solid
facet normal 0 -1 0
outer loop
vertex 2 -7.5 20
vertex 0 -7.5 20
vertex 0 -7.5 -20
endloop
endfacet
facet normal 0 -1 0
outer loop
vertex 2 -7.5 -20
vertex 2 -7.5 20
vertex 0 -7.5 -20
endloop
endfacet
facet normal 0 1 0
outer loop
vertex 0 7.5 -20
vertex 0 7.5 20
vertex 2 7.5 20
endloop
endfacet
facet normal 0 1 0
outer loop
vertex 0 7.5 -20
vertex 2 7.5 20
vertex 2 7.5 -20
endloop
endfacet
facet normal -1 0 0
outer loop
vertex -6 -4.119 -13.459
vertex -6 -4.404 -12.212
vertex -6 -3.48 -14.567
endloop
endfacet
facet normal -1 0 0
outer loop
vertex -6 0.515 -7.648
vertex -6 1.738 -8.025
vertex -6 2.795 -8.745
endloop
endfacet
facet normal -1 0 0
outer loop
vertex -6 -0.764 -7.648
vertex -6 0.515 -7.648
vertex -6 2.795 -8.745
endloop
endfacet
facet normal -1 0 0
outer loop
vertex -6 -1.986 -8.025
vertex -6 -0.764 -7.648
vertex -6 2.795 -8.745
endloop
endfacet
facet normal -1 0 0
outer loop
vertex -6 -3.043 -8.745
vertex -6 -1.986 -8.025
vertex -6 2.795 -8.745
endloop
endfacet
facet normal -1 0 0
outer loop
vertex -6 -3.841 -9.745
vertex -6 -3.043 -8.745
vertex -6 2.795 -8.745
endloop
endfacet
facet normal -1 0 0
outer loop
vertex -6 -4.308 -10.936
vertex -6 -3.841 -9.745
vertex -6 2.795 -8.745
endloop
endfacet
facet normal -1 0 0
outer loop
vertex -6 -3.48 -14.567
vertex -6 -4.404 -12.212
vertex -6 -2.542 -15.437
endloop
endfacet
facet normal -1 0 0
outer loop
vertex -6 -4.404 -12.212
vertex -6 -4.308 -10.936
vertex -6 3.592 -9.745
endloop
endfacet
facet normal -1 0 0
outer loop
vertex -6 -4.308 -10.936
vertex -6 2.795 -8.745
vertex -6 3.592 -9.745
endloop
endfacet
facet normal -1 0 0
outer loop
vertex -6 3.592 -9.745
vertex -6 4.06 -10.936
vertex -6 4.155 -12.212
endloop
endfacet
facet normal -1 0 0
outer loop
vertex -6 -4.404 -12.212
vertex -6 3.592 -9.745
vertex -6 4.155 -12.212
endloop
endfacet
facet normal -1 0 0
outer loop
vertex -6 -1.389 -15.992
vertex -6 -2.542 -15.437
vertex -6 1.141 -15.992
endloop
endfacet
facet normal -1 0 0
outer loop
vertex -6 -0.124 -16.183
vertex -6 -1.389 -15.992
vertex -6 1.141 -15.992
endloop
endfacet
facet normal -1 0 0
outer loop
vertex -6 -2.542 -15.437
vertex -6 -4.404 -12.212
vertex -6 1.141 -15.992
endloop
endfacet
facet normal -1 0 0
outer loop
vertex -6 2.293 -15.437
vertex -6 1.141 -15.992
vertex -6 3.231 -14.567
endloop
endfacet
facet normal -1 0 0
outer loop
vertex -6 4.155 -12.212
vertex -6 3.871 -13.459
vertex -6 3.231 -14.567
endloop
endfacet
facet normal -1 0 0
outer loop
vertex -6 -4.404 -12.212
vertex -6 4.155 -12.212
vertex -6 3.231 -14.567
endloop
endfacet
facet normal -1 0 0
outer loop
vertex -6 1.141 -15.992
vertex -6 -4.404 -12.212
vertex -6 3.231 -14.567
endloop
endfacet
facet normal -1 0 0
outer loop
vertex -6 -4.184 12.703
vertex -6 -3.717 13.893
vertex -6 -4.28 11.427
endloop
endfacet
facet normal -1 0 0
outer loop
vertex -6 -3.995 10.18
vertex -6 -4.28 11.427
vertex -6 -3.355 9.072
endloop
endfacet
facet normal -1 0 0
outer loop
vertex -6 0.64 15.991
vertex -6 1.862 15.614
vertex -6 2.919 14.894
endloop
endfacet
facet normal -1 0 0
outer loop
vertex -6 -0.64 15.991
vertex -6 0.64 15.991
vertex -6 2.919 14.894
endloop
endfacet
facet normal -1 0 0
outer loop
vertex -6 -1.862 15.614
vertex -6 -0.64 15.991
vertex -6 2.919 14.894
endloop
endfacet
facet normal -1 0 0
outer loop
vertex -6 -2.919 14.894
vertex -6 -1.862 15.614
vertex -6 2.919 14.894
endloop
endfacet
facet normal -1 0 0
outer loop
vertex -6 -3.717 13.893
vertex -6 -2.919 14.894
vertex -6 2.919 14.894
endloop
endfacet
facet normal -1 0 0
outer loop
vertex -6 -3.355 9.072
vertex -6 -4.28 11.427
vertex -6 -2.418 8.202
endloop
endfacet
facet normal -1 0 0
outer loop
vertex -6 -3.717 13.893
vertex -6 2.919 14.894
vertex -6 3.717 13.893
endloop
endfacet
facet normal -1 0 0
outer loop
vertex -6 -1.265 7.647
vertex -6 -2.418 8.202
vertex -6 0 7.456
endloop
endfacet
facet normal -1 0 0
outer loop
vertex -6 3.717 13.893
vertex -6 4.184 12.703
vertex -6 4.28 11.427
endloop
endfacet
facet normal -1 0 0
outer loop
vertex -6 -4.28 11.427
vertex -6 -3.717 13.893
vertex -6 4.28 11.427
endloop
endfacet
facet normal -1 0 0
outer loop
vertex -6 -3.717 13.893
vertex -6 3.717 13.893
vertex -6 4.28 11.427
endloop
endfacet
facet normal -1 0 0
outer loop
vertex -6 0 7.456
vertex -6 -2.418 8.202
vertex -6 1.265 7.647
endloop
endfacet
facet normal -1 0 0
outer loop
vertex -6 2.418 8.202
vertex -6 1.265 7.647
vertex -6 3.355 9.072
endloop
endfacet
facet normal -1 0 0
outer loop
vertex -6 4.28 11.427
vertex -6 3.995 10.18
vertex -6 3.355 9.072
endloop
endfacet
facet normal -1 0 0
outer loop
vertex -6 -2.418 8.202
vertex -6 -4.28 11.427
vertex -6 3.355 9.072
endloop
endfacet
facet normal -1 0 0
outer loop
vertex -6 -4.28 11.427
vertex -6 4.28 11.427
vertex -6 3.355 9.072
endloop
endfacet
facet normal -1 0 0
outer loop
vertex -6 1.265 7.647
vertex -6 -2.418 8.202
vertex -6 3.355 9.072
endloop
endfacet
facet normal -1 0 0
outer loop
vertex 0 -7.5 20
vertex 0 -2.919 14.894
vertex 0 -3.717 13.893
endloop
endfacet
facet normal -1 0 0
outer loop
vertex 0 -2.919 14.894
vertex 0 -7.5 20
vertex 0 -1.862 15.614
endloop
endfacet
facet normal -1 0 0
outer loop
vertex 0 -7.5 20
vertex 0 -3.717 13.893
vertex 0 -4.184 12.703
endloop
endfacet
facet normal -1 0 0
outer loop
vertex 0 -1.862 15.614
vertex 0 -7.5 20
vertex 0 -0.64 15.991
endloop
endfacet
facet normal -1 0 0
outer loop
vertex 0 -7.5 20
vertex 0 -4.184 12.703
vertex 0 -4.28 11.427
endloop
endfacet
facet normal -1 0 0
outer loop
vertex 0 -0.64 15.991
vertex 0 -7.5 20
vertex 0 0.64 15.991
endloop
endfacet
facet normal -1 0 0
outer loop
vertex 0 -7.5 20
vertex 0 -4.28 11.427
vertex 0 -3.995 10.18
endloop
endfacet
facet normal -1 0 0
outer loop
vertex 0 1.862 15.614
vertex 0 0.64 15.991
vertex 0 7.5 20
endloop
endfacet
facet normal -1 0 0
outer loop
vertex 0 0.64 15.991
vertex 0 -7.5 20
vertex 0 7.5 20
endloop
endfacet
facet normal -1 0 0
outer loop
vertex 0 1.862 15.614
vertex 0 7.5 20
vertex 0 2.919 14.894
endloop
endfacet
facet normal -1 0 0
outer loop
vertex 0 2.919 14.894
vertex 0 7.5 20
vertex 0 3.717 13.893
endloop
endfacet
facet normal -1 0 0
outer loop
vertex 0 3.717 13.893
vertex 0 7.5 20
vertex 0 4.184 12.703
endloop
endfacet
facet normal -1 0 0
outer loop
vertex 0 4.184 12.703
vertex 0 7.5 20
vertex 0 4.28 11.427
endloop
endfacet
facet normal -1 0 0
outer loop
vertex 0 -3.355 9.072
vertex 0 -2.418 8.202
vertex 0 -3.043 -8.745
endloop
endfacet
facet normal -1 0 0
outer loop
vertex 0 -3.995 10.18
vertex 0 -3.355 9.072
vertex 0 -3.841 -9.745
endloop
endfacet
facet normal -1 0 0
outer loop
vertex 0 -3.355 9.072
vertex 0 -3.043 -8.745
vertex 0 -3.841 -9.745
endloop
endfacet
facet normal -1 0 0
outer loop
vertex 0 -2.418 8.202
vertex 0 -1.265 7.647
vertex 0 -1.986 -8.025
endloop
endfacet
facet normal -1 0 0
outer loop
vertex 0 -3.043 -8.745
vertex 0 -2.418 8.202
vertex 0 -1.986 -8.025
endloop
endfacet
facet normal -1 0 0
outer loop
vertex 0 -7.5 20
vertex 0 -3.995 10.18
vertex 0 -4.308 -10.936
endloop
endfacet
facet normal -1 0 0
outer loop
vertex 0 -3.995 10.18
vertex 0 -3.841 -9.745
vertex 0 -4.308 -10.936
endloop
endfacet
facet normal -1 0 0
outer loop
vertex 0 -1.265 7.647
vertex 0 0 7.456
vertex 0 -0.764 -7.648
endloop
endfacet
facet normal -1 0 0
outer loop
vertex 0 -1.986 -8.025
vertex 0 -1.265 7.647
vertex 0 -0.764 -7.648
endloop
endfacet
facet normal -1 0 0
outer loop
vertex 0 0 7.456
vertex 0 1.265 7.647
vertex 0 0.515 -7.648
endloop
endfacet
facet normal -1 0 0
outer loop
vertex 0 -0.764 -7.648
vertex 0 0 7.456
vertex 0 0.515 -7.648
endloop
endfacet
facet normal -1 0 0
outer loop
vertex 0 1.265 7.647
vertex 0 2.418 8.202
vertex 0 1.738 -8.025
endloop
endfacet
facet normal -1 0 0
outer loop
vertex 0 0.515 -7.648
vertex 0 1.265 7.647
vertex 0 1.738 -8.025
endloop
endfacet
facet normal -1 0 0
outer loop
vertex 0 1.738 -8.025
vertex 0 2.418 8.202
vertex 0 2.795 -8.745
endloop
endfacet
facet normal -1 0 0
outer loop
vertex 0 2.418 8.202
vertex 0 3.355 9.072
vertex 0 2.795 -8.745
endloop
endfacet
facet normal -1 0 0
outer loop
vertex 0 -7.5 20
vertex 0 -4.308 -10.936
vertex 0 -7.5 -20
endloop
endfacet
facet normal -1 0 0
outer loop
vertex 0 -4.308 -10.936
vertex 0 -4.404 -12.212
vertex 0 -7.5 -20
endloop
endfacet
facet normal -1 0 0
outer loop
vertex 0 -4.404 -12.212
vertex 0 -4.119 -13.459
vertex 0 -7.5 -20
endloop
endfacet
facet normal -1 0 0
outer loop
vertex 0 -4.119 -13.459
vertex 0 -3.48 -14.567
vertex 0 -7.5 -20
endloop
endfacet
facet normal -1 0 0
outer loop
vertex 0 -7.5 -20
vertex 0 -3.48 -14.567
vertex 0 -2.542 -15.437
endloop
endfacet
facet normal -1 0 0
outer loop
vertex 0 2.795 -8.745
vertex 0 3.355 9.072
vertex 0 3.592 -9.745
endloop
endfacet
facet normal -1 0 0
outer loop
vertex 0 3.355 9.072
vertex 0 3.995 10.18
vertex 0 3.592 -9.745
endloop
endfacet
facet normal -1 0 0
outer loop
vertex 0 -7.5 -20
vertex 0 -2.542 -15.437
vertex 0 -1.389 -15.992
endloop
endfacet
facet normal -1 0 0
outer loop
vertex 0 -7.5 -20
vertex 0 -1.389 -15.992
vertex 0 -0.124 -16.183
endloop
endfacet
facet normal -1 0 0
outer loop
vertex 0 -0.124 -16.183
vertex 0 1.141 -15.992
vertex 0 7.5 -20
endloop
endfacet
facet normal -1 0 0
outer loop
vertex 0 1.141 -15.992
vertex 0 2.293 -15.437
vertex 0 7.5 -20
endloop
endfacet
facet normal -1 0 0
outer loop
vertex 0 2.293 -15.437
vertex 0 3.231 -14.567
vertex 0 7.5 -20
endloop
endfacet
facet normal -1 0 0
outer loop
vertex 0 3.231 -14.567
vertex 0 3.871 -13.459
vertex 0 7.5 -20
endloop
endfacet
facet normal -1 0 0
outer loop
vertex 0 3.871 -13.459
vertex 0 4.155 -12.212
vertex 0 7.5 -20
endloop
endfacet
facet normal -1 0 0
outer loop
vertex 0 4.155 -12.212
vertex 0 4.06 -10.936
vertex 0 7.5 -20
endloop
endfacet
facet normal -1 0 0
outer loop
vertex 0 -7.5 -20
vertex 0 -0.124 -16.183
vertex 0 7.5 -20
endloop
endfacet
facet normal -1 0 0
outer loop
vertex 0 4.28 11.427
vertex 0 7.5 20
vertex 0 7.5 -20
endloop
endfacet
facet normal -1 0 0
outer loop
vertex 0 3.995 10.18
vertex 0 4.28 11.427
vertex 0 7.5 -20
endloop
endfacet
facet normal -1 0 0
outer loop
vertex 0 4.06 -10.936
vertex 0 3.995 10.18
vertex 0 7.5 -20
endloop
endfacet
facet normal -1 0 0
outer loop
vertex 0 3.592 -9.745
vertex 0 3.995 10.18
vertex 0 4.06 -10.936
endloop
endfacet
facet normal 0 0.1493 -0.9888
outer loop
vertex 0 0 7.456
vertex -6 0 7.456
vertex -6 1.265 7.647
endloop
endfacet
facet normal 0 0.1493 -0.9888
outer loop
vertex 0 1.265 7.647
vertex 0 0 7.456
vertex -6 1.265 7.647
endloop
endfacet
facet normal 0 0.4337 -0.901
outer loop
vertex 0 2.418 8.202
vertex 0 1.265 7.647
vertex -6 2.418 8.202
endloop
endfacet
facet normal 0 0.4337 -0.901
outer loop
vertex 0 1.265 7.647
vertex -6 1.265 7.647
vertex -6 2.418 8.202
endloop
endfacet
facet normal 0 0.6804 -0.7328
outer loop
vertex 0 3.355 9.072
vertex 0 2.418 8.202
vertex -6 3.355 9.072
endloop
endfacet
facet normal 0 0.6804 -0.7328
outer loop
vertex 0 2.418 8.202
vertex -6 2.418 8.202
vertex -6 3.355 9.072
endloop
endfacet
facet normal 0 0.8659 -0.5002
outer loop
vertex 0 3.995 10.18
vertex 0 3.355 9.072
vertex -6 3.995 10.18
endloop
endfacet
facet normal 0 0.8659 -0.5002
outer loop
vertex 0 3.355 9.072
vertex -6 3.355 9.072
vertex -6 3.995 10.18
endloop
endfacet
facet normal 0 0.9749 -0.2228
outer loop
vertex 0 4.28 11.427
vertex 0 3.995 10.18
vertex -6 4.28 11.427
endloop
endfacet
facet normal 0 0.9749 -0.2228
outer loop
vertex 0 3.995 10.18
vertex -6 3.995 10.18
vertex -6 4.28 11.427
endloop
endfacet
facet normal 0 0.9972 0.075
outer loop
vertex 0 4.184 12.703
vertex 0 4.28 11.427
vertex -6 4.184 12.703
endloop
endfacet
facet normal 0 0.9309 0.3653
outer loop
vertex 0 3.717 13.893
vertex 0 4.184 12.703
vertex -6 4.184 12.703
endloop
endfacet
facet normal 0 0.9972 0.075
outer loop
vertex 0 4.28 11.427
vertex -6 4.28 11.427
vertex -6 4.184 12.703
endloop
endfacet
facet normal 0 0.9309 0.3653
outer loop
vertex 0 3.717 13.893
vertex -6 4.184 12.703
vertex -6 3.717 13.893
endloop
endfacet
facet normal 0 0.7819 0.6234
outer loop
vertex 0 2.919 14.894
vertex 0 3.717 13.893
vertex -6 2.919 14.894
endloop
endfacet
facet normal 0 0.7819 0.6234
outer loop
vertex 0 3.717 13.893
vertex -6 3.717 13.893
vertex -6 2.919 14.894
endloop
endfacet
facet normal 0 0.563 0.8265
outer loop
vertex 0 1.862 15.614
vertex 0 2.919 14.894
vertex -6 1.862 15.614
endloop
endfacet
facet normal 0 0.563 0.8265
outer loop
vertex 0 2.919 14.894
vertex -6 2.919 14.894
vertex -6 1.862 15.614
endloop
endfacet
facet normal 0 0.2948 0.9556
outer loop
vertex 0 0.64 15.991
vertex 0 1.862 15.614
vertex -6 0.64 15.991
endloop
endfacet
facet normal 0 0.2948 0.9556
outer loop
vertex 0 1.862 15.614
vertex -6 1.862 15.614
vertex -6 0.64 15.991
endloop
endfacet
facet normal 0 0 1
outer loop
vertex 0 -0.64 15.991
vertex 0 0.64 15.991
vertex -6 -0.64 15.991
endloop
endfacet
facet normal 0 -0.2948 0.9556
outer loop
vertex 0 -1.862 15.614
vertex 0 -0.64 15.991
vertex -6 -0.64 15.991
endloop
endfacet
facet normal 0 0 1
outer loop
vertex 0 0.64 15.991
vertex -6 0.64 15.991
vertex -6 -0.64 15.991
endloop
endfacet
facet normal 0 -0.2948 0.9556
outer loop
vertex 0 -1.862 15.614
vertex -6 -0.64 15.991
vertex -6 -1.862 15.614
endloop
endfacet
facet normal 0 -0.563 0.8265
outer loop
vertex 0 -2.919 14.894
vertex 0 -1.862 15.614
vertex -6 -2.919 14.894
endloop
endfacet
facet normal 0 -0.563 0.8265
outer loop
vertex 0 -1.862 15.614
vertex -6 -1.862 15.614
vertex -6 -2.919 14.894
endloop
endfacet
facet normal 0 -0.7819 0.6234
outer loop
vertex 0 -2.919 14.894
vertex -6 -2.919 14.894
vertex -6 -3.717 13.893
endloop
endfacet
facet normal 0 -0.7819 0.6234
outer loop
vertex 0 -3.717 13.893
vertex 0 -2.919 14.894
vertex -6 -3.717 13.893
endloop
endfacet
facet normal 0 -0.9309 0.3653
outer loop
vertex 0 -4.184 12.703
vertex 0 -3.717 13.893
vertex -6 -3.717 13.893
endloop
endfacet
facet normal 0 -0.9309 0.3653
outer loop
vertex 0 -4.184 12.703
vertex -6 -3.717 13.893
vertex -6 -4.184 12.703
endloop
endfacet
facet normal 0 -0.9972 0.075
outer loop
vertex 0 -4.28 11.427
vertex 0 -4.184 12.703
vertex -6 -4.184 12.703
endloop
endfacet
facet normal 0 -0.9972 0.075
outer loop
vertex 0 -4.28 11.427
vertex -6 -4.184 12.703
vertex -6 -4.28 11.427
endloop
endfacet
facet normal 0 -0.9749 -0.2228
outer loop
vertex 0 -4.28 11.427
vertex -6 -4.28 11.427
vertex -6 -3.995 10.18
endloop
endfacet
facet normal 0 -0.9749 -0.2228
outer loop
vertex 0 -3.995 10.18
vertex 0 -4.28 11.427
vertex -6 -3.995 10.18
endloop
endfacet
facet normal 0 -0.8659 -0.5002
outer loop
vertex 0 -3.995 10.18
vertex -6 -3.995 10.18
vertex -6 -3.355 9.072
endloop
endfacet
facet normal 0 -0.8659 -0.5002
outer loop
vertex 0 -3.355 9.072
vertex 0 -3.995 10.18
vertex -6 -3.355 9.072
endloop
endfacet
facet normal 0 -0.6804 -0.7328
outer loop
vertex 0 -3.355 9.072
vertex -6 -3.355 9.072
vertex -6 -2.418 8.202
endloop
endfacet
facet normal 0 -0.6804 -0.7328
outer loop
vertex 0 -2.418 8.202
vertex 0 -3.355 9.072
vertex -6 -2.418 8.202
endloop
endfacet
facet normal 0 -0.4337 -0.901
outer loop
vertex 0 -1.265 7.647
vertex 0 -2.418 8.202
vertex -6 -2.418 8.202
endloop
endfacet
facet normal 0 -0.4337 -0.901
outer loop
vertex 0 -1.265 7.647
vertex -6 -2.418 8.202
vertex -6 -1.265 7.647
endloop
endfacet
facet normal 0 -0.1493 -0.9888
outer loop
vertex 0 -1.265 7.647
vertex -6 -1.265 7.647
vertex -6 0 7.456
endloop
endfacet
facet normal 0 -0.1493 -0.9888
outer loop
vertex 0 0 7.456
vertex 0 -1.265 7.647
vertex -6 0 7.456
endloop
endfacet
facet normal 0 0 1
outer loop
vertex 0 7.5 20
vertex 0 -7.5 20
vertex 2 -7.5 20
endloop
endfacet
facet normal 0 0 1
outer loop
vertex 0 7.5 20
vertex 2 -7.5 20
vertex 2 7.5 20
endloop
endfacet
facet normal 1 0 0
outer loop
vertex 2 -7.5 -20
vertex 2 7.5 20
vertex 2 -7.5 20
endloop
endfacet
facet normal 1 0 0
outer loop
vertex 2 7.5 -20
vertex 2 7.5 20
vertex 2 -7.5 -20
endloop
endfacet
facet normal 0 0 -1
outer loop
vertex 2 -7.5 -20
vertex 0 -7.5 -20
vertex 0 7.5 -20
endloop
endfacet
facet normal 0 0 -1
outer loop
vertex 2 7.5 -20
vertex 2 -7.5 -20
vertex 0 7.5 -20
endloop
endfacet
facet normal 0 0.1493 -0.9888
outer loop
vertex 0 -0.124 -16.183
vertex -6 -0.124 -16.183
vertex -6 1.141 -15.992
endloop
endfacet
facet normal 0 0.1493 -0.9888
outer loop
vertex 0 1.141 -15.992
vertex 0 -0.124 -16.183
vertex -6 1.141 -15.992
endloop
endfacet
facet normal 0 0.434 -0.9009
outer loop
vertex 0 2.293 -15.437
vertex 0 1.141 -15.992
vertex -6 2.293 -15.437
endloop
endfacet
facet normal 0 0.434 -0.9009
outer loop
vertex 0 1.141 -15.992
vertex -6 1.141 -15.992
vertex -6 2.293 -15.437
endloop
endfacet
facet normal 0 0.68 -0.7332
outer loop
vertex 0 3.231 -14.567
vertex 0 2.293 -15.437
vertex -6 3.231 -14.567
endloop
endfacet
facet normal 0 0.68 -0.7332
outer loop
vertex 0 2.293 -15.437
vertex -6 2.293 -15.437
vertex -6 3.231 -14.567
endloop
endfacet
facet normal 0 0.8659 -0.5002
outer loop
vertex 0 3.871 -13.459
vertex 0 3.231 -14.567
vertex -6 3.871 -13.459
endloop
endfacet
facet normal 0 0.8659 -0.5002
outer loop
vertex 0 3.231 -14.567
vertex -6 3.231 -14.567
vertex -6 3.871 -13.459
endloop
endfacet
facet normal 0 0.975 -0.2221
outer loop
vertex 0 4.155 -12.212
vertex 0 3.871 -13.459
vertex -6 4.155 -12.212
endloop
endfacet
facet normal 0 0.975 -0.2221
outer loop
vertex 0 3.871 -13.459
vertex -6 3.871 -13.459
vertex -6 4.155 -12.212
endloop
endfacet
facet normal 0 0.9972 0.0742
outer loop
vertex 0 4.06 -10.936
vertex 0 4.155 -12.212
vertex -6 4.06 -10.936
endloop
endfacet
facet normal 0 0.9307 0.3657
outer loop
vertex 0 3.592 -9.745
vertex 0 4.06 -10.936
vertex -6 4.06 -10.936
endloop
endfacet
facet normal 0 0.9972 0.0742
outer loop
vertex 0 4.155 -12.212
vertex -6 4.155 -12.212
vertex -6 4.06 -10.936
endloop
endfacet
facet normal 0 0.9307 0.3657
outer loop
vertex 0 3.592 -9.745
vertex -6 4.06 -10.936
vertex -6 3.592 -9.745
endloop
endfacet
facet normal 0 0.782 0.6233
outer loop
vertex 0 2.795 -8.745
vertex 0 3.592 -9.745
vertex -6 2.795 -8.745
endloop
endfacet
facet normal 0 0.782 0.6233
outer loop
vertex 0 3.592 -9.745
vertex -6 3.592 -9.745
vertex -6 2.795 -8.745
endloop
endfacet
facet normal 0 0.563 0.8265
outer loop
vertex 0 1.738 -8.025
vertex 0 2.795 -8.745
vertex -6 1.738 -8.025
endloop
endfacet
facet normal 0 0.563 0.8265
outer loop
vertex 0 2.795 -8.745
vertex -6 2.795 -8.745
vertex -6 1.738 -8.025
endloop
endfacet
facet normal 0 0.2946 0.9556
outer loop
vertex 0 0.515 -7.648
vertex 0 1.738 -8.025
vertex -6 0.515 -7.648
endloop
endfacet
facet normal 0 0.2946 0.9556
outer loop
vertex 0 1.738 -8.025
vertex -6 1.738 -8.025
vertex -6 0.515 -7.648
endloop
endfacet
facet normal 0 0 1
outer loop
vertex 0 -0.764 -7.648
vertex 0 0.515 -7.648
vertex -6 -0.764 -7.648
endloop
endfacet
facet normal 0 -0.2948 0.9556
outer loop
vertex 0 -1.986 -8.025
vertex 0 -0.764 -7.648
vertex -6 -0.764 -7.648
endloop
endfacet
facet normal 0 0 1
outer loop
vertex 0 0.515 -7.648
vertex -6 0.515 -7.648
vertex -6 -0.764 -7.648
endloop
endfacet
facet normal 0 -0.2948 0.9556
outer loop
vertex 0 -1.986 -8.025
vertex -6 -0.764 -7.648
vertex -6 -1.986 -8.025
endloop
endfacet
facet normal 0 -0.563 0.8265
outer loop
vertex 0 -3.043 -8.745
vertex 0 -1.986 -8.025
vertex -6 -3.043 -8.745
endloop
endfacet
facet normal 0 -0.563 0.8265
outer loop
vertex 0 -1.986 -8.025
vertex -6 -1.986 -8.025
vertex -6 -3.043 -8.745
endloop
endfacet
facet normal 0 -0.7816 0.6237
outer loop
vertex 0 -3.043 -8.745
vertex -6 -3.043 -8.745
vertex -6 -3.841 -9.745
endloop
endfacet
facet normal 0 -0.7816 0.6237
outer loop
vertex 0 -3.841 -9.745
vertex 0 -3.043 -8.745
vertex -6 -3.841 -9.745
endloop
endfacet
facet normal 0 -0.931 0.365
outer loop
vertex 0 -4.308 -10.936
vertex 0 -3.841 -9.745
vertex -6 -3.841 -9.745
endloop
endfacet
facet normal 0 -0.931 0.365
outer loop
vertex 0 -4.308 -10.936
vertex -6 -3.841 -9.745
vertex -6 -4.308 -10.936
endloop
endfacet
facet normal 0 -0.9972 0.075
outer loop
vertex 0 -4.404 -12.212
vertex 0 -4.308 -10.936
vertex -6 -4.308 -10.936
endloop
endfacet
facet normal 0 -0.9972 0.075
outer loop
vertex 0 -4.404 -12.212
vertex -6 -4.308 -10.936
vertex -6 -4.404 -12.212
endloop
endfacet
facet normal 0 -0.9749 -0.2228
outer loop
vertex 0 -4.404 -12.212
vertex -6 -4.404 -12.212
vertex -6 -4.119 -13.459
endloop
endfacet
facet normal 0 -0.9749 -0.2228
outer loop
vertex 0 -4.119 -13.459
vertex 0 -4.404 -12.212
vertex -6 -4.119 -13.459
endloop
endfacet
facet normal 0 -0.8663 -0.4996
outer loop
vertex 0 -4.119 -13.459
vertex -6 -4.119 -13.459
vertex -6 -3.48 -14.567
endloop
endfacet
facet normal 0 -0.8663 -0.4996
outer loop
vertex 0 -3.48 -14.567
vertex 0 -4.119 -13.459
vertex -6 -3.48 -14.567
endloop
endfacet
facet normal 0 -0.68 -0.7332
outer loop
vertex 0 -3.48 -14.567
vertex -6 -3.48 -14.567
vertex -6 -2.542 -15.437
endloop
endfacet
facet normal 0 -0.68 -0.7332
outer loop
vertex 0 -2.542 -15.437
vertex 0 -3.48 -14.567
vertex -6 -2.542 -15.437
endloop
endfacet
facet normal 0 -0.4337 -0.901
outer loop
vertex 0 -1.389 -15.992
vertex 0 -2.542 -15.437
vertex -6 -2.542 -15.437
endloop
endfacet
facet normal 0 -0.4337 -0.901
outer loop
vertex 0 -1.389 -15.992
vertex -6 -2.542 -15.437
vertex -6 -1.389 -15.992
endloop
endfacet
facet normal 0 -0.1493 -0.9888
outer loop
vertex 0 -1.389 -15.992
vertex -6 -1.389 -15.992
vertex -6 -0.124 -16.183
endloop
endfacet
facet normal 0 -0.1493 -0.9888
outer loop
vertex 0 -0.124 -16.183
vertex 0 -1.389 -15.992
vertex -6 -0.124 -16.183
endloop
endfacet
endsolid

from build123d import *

# Parameters (mm, degrees)
SKETCH1_W           = 40
SKETCH1_H           = 15
SKETCH1_R           = 4.291657496
BOSS_EXTRUDE1_DEPTH = 2
BOSS_EXTRUDE2_START = -8
SKETCH2_R           = 4.291657496
BOSS_EXTRUDE2_DEPTH = 8


with BuildPart() as part:
    # Sketch1 → Boss-Extrude1 (new body)
    with BuildSketch(Plane(origin=(0, 0, 0), x_dir=(0, 0, -1), z_dir=(1, 0, 0))):
        Rectangle(SKETCH1_W, SKETCH1_H)
        with Locations((-11.747572816, 0)):
            Circle(SKETCH1_R, mode=Mode.SUBTRACT)
        with Locations((11.891261172, -0.124269275)):
            Circle(SKETCH1_R, mode=Mode.SUBTRACT)
    extrude(amount=BOSS_EXTRUDE1_DEPTH)

    # Sketch2 → Boss-Extrude2 (add)
    with BuildSketch(Plane(origin=(2, 0, 0), x_dir=(0, 0, -1), z_dir=(1, 0, 0)).offset(BOSS_EXTRUDE2_START)):
        with Locations((-11.747572816, 0)):
            Circle(SKETCH2_R)
        with Locations((11.891261172, -0.124269275)):
            Circle(SKETCH2_R)
    extrude(amount=BOSS_EXTRUDE2_DEPTH)


solid = part.part
